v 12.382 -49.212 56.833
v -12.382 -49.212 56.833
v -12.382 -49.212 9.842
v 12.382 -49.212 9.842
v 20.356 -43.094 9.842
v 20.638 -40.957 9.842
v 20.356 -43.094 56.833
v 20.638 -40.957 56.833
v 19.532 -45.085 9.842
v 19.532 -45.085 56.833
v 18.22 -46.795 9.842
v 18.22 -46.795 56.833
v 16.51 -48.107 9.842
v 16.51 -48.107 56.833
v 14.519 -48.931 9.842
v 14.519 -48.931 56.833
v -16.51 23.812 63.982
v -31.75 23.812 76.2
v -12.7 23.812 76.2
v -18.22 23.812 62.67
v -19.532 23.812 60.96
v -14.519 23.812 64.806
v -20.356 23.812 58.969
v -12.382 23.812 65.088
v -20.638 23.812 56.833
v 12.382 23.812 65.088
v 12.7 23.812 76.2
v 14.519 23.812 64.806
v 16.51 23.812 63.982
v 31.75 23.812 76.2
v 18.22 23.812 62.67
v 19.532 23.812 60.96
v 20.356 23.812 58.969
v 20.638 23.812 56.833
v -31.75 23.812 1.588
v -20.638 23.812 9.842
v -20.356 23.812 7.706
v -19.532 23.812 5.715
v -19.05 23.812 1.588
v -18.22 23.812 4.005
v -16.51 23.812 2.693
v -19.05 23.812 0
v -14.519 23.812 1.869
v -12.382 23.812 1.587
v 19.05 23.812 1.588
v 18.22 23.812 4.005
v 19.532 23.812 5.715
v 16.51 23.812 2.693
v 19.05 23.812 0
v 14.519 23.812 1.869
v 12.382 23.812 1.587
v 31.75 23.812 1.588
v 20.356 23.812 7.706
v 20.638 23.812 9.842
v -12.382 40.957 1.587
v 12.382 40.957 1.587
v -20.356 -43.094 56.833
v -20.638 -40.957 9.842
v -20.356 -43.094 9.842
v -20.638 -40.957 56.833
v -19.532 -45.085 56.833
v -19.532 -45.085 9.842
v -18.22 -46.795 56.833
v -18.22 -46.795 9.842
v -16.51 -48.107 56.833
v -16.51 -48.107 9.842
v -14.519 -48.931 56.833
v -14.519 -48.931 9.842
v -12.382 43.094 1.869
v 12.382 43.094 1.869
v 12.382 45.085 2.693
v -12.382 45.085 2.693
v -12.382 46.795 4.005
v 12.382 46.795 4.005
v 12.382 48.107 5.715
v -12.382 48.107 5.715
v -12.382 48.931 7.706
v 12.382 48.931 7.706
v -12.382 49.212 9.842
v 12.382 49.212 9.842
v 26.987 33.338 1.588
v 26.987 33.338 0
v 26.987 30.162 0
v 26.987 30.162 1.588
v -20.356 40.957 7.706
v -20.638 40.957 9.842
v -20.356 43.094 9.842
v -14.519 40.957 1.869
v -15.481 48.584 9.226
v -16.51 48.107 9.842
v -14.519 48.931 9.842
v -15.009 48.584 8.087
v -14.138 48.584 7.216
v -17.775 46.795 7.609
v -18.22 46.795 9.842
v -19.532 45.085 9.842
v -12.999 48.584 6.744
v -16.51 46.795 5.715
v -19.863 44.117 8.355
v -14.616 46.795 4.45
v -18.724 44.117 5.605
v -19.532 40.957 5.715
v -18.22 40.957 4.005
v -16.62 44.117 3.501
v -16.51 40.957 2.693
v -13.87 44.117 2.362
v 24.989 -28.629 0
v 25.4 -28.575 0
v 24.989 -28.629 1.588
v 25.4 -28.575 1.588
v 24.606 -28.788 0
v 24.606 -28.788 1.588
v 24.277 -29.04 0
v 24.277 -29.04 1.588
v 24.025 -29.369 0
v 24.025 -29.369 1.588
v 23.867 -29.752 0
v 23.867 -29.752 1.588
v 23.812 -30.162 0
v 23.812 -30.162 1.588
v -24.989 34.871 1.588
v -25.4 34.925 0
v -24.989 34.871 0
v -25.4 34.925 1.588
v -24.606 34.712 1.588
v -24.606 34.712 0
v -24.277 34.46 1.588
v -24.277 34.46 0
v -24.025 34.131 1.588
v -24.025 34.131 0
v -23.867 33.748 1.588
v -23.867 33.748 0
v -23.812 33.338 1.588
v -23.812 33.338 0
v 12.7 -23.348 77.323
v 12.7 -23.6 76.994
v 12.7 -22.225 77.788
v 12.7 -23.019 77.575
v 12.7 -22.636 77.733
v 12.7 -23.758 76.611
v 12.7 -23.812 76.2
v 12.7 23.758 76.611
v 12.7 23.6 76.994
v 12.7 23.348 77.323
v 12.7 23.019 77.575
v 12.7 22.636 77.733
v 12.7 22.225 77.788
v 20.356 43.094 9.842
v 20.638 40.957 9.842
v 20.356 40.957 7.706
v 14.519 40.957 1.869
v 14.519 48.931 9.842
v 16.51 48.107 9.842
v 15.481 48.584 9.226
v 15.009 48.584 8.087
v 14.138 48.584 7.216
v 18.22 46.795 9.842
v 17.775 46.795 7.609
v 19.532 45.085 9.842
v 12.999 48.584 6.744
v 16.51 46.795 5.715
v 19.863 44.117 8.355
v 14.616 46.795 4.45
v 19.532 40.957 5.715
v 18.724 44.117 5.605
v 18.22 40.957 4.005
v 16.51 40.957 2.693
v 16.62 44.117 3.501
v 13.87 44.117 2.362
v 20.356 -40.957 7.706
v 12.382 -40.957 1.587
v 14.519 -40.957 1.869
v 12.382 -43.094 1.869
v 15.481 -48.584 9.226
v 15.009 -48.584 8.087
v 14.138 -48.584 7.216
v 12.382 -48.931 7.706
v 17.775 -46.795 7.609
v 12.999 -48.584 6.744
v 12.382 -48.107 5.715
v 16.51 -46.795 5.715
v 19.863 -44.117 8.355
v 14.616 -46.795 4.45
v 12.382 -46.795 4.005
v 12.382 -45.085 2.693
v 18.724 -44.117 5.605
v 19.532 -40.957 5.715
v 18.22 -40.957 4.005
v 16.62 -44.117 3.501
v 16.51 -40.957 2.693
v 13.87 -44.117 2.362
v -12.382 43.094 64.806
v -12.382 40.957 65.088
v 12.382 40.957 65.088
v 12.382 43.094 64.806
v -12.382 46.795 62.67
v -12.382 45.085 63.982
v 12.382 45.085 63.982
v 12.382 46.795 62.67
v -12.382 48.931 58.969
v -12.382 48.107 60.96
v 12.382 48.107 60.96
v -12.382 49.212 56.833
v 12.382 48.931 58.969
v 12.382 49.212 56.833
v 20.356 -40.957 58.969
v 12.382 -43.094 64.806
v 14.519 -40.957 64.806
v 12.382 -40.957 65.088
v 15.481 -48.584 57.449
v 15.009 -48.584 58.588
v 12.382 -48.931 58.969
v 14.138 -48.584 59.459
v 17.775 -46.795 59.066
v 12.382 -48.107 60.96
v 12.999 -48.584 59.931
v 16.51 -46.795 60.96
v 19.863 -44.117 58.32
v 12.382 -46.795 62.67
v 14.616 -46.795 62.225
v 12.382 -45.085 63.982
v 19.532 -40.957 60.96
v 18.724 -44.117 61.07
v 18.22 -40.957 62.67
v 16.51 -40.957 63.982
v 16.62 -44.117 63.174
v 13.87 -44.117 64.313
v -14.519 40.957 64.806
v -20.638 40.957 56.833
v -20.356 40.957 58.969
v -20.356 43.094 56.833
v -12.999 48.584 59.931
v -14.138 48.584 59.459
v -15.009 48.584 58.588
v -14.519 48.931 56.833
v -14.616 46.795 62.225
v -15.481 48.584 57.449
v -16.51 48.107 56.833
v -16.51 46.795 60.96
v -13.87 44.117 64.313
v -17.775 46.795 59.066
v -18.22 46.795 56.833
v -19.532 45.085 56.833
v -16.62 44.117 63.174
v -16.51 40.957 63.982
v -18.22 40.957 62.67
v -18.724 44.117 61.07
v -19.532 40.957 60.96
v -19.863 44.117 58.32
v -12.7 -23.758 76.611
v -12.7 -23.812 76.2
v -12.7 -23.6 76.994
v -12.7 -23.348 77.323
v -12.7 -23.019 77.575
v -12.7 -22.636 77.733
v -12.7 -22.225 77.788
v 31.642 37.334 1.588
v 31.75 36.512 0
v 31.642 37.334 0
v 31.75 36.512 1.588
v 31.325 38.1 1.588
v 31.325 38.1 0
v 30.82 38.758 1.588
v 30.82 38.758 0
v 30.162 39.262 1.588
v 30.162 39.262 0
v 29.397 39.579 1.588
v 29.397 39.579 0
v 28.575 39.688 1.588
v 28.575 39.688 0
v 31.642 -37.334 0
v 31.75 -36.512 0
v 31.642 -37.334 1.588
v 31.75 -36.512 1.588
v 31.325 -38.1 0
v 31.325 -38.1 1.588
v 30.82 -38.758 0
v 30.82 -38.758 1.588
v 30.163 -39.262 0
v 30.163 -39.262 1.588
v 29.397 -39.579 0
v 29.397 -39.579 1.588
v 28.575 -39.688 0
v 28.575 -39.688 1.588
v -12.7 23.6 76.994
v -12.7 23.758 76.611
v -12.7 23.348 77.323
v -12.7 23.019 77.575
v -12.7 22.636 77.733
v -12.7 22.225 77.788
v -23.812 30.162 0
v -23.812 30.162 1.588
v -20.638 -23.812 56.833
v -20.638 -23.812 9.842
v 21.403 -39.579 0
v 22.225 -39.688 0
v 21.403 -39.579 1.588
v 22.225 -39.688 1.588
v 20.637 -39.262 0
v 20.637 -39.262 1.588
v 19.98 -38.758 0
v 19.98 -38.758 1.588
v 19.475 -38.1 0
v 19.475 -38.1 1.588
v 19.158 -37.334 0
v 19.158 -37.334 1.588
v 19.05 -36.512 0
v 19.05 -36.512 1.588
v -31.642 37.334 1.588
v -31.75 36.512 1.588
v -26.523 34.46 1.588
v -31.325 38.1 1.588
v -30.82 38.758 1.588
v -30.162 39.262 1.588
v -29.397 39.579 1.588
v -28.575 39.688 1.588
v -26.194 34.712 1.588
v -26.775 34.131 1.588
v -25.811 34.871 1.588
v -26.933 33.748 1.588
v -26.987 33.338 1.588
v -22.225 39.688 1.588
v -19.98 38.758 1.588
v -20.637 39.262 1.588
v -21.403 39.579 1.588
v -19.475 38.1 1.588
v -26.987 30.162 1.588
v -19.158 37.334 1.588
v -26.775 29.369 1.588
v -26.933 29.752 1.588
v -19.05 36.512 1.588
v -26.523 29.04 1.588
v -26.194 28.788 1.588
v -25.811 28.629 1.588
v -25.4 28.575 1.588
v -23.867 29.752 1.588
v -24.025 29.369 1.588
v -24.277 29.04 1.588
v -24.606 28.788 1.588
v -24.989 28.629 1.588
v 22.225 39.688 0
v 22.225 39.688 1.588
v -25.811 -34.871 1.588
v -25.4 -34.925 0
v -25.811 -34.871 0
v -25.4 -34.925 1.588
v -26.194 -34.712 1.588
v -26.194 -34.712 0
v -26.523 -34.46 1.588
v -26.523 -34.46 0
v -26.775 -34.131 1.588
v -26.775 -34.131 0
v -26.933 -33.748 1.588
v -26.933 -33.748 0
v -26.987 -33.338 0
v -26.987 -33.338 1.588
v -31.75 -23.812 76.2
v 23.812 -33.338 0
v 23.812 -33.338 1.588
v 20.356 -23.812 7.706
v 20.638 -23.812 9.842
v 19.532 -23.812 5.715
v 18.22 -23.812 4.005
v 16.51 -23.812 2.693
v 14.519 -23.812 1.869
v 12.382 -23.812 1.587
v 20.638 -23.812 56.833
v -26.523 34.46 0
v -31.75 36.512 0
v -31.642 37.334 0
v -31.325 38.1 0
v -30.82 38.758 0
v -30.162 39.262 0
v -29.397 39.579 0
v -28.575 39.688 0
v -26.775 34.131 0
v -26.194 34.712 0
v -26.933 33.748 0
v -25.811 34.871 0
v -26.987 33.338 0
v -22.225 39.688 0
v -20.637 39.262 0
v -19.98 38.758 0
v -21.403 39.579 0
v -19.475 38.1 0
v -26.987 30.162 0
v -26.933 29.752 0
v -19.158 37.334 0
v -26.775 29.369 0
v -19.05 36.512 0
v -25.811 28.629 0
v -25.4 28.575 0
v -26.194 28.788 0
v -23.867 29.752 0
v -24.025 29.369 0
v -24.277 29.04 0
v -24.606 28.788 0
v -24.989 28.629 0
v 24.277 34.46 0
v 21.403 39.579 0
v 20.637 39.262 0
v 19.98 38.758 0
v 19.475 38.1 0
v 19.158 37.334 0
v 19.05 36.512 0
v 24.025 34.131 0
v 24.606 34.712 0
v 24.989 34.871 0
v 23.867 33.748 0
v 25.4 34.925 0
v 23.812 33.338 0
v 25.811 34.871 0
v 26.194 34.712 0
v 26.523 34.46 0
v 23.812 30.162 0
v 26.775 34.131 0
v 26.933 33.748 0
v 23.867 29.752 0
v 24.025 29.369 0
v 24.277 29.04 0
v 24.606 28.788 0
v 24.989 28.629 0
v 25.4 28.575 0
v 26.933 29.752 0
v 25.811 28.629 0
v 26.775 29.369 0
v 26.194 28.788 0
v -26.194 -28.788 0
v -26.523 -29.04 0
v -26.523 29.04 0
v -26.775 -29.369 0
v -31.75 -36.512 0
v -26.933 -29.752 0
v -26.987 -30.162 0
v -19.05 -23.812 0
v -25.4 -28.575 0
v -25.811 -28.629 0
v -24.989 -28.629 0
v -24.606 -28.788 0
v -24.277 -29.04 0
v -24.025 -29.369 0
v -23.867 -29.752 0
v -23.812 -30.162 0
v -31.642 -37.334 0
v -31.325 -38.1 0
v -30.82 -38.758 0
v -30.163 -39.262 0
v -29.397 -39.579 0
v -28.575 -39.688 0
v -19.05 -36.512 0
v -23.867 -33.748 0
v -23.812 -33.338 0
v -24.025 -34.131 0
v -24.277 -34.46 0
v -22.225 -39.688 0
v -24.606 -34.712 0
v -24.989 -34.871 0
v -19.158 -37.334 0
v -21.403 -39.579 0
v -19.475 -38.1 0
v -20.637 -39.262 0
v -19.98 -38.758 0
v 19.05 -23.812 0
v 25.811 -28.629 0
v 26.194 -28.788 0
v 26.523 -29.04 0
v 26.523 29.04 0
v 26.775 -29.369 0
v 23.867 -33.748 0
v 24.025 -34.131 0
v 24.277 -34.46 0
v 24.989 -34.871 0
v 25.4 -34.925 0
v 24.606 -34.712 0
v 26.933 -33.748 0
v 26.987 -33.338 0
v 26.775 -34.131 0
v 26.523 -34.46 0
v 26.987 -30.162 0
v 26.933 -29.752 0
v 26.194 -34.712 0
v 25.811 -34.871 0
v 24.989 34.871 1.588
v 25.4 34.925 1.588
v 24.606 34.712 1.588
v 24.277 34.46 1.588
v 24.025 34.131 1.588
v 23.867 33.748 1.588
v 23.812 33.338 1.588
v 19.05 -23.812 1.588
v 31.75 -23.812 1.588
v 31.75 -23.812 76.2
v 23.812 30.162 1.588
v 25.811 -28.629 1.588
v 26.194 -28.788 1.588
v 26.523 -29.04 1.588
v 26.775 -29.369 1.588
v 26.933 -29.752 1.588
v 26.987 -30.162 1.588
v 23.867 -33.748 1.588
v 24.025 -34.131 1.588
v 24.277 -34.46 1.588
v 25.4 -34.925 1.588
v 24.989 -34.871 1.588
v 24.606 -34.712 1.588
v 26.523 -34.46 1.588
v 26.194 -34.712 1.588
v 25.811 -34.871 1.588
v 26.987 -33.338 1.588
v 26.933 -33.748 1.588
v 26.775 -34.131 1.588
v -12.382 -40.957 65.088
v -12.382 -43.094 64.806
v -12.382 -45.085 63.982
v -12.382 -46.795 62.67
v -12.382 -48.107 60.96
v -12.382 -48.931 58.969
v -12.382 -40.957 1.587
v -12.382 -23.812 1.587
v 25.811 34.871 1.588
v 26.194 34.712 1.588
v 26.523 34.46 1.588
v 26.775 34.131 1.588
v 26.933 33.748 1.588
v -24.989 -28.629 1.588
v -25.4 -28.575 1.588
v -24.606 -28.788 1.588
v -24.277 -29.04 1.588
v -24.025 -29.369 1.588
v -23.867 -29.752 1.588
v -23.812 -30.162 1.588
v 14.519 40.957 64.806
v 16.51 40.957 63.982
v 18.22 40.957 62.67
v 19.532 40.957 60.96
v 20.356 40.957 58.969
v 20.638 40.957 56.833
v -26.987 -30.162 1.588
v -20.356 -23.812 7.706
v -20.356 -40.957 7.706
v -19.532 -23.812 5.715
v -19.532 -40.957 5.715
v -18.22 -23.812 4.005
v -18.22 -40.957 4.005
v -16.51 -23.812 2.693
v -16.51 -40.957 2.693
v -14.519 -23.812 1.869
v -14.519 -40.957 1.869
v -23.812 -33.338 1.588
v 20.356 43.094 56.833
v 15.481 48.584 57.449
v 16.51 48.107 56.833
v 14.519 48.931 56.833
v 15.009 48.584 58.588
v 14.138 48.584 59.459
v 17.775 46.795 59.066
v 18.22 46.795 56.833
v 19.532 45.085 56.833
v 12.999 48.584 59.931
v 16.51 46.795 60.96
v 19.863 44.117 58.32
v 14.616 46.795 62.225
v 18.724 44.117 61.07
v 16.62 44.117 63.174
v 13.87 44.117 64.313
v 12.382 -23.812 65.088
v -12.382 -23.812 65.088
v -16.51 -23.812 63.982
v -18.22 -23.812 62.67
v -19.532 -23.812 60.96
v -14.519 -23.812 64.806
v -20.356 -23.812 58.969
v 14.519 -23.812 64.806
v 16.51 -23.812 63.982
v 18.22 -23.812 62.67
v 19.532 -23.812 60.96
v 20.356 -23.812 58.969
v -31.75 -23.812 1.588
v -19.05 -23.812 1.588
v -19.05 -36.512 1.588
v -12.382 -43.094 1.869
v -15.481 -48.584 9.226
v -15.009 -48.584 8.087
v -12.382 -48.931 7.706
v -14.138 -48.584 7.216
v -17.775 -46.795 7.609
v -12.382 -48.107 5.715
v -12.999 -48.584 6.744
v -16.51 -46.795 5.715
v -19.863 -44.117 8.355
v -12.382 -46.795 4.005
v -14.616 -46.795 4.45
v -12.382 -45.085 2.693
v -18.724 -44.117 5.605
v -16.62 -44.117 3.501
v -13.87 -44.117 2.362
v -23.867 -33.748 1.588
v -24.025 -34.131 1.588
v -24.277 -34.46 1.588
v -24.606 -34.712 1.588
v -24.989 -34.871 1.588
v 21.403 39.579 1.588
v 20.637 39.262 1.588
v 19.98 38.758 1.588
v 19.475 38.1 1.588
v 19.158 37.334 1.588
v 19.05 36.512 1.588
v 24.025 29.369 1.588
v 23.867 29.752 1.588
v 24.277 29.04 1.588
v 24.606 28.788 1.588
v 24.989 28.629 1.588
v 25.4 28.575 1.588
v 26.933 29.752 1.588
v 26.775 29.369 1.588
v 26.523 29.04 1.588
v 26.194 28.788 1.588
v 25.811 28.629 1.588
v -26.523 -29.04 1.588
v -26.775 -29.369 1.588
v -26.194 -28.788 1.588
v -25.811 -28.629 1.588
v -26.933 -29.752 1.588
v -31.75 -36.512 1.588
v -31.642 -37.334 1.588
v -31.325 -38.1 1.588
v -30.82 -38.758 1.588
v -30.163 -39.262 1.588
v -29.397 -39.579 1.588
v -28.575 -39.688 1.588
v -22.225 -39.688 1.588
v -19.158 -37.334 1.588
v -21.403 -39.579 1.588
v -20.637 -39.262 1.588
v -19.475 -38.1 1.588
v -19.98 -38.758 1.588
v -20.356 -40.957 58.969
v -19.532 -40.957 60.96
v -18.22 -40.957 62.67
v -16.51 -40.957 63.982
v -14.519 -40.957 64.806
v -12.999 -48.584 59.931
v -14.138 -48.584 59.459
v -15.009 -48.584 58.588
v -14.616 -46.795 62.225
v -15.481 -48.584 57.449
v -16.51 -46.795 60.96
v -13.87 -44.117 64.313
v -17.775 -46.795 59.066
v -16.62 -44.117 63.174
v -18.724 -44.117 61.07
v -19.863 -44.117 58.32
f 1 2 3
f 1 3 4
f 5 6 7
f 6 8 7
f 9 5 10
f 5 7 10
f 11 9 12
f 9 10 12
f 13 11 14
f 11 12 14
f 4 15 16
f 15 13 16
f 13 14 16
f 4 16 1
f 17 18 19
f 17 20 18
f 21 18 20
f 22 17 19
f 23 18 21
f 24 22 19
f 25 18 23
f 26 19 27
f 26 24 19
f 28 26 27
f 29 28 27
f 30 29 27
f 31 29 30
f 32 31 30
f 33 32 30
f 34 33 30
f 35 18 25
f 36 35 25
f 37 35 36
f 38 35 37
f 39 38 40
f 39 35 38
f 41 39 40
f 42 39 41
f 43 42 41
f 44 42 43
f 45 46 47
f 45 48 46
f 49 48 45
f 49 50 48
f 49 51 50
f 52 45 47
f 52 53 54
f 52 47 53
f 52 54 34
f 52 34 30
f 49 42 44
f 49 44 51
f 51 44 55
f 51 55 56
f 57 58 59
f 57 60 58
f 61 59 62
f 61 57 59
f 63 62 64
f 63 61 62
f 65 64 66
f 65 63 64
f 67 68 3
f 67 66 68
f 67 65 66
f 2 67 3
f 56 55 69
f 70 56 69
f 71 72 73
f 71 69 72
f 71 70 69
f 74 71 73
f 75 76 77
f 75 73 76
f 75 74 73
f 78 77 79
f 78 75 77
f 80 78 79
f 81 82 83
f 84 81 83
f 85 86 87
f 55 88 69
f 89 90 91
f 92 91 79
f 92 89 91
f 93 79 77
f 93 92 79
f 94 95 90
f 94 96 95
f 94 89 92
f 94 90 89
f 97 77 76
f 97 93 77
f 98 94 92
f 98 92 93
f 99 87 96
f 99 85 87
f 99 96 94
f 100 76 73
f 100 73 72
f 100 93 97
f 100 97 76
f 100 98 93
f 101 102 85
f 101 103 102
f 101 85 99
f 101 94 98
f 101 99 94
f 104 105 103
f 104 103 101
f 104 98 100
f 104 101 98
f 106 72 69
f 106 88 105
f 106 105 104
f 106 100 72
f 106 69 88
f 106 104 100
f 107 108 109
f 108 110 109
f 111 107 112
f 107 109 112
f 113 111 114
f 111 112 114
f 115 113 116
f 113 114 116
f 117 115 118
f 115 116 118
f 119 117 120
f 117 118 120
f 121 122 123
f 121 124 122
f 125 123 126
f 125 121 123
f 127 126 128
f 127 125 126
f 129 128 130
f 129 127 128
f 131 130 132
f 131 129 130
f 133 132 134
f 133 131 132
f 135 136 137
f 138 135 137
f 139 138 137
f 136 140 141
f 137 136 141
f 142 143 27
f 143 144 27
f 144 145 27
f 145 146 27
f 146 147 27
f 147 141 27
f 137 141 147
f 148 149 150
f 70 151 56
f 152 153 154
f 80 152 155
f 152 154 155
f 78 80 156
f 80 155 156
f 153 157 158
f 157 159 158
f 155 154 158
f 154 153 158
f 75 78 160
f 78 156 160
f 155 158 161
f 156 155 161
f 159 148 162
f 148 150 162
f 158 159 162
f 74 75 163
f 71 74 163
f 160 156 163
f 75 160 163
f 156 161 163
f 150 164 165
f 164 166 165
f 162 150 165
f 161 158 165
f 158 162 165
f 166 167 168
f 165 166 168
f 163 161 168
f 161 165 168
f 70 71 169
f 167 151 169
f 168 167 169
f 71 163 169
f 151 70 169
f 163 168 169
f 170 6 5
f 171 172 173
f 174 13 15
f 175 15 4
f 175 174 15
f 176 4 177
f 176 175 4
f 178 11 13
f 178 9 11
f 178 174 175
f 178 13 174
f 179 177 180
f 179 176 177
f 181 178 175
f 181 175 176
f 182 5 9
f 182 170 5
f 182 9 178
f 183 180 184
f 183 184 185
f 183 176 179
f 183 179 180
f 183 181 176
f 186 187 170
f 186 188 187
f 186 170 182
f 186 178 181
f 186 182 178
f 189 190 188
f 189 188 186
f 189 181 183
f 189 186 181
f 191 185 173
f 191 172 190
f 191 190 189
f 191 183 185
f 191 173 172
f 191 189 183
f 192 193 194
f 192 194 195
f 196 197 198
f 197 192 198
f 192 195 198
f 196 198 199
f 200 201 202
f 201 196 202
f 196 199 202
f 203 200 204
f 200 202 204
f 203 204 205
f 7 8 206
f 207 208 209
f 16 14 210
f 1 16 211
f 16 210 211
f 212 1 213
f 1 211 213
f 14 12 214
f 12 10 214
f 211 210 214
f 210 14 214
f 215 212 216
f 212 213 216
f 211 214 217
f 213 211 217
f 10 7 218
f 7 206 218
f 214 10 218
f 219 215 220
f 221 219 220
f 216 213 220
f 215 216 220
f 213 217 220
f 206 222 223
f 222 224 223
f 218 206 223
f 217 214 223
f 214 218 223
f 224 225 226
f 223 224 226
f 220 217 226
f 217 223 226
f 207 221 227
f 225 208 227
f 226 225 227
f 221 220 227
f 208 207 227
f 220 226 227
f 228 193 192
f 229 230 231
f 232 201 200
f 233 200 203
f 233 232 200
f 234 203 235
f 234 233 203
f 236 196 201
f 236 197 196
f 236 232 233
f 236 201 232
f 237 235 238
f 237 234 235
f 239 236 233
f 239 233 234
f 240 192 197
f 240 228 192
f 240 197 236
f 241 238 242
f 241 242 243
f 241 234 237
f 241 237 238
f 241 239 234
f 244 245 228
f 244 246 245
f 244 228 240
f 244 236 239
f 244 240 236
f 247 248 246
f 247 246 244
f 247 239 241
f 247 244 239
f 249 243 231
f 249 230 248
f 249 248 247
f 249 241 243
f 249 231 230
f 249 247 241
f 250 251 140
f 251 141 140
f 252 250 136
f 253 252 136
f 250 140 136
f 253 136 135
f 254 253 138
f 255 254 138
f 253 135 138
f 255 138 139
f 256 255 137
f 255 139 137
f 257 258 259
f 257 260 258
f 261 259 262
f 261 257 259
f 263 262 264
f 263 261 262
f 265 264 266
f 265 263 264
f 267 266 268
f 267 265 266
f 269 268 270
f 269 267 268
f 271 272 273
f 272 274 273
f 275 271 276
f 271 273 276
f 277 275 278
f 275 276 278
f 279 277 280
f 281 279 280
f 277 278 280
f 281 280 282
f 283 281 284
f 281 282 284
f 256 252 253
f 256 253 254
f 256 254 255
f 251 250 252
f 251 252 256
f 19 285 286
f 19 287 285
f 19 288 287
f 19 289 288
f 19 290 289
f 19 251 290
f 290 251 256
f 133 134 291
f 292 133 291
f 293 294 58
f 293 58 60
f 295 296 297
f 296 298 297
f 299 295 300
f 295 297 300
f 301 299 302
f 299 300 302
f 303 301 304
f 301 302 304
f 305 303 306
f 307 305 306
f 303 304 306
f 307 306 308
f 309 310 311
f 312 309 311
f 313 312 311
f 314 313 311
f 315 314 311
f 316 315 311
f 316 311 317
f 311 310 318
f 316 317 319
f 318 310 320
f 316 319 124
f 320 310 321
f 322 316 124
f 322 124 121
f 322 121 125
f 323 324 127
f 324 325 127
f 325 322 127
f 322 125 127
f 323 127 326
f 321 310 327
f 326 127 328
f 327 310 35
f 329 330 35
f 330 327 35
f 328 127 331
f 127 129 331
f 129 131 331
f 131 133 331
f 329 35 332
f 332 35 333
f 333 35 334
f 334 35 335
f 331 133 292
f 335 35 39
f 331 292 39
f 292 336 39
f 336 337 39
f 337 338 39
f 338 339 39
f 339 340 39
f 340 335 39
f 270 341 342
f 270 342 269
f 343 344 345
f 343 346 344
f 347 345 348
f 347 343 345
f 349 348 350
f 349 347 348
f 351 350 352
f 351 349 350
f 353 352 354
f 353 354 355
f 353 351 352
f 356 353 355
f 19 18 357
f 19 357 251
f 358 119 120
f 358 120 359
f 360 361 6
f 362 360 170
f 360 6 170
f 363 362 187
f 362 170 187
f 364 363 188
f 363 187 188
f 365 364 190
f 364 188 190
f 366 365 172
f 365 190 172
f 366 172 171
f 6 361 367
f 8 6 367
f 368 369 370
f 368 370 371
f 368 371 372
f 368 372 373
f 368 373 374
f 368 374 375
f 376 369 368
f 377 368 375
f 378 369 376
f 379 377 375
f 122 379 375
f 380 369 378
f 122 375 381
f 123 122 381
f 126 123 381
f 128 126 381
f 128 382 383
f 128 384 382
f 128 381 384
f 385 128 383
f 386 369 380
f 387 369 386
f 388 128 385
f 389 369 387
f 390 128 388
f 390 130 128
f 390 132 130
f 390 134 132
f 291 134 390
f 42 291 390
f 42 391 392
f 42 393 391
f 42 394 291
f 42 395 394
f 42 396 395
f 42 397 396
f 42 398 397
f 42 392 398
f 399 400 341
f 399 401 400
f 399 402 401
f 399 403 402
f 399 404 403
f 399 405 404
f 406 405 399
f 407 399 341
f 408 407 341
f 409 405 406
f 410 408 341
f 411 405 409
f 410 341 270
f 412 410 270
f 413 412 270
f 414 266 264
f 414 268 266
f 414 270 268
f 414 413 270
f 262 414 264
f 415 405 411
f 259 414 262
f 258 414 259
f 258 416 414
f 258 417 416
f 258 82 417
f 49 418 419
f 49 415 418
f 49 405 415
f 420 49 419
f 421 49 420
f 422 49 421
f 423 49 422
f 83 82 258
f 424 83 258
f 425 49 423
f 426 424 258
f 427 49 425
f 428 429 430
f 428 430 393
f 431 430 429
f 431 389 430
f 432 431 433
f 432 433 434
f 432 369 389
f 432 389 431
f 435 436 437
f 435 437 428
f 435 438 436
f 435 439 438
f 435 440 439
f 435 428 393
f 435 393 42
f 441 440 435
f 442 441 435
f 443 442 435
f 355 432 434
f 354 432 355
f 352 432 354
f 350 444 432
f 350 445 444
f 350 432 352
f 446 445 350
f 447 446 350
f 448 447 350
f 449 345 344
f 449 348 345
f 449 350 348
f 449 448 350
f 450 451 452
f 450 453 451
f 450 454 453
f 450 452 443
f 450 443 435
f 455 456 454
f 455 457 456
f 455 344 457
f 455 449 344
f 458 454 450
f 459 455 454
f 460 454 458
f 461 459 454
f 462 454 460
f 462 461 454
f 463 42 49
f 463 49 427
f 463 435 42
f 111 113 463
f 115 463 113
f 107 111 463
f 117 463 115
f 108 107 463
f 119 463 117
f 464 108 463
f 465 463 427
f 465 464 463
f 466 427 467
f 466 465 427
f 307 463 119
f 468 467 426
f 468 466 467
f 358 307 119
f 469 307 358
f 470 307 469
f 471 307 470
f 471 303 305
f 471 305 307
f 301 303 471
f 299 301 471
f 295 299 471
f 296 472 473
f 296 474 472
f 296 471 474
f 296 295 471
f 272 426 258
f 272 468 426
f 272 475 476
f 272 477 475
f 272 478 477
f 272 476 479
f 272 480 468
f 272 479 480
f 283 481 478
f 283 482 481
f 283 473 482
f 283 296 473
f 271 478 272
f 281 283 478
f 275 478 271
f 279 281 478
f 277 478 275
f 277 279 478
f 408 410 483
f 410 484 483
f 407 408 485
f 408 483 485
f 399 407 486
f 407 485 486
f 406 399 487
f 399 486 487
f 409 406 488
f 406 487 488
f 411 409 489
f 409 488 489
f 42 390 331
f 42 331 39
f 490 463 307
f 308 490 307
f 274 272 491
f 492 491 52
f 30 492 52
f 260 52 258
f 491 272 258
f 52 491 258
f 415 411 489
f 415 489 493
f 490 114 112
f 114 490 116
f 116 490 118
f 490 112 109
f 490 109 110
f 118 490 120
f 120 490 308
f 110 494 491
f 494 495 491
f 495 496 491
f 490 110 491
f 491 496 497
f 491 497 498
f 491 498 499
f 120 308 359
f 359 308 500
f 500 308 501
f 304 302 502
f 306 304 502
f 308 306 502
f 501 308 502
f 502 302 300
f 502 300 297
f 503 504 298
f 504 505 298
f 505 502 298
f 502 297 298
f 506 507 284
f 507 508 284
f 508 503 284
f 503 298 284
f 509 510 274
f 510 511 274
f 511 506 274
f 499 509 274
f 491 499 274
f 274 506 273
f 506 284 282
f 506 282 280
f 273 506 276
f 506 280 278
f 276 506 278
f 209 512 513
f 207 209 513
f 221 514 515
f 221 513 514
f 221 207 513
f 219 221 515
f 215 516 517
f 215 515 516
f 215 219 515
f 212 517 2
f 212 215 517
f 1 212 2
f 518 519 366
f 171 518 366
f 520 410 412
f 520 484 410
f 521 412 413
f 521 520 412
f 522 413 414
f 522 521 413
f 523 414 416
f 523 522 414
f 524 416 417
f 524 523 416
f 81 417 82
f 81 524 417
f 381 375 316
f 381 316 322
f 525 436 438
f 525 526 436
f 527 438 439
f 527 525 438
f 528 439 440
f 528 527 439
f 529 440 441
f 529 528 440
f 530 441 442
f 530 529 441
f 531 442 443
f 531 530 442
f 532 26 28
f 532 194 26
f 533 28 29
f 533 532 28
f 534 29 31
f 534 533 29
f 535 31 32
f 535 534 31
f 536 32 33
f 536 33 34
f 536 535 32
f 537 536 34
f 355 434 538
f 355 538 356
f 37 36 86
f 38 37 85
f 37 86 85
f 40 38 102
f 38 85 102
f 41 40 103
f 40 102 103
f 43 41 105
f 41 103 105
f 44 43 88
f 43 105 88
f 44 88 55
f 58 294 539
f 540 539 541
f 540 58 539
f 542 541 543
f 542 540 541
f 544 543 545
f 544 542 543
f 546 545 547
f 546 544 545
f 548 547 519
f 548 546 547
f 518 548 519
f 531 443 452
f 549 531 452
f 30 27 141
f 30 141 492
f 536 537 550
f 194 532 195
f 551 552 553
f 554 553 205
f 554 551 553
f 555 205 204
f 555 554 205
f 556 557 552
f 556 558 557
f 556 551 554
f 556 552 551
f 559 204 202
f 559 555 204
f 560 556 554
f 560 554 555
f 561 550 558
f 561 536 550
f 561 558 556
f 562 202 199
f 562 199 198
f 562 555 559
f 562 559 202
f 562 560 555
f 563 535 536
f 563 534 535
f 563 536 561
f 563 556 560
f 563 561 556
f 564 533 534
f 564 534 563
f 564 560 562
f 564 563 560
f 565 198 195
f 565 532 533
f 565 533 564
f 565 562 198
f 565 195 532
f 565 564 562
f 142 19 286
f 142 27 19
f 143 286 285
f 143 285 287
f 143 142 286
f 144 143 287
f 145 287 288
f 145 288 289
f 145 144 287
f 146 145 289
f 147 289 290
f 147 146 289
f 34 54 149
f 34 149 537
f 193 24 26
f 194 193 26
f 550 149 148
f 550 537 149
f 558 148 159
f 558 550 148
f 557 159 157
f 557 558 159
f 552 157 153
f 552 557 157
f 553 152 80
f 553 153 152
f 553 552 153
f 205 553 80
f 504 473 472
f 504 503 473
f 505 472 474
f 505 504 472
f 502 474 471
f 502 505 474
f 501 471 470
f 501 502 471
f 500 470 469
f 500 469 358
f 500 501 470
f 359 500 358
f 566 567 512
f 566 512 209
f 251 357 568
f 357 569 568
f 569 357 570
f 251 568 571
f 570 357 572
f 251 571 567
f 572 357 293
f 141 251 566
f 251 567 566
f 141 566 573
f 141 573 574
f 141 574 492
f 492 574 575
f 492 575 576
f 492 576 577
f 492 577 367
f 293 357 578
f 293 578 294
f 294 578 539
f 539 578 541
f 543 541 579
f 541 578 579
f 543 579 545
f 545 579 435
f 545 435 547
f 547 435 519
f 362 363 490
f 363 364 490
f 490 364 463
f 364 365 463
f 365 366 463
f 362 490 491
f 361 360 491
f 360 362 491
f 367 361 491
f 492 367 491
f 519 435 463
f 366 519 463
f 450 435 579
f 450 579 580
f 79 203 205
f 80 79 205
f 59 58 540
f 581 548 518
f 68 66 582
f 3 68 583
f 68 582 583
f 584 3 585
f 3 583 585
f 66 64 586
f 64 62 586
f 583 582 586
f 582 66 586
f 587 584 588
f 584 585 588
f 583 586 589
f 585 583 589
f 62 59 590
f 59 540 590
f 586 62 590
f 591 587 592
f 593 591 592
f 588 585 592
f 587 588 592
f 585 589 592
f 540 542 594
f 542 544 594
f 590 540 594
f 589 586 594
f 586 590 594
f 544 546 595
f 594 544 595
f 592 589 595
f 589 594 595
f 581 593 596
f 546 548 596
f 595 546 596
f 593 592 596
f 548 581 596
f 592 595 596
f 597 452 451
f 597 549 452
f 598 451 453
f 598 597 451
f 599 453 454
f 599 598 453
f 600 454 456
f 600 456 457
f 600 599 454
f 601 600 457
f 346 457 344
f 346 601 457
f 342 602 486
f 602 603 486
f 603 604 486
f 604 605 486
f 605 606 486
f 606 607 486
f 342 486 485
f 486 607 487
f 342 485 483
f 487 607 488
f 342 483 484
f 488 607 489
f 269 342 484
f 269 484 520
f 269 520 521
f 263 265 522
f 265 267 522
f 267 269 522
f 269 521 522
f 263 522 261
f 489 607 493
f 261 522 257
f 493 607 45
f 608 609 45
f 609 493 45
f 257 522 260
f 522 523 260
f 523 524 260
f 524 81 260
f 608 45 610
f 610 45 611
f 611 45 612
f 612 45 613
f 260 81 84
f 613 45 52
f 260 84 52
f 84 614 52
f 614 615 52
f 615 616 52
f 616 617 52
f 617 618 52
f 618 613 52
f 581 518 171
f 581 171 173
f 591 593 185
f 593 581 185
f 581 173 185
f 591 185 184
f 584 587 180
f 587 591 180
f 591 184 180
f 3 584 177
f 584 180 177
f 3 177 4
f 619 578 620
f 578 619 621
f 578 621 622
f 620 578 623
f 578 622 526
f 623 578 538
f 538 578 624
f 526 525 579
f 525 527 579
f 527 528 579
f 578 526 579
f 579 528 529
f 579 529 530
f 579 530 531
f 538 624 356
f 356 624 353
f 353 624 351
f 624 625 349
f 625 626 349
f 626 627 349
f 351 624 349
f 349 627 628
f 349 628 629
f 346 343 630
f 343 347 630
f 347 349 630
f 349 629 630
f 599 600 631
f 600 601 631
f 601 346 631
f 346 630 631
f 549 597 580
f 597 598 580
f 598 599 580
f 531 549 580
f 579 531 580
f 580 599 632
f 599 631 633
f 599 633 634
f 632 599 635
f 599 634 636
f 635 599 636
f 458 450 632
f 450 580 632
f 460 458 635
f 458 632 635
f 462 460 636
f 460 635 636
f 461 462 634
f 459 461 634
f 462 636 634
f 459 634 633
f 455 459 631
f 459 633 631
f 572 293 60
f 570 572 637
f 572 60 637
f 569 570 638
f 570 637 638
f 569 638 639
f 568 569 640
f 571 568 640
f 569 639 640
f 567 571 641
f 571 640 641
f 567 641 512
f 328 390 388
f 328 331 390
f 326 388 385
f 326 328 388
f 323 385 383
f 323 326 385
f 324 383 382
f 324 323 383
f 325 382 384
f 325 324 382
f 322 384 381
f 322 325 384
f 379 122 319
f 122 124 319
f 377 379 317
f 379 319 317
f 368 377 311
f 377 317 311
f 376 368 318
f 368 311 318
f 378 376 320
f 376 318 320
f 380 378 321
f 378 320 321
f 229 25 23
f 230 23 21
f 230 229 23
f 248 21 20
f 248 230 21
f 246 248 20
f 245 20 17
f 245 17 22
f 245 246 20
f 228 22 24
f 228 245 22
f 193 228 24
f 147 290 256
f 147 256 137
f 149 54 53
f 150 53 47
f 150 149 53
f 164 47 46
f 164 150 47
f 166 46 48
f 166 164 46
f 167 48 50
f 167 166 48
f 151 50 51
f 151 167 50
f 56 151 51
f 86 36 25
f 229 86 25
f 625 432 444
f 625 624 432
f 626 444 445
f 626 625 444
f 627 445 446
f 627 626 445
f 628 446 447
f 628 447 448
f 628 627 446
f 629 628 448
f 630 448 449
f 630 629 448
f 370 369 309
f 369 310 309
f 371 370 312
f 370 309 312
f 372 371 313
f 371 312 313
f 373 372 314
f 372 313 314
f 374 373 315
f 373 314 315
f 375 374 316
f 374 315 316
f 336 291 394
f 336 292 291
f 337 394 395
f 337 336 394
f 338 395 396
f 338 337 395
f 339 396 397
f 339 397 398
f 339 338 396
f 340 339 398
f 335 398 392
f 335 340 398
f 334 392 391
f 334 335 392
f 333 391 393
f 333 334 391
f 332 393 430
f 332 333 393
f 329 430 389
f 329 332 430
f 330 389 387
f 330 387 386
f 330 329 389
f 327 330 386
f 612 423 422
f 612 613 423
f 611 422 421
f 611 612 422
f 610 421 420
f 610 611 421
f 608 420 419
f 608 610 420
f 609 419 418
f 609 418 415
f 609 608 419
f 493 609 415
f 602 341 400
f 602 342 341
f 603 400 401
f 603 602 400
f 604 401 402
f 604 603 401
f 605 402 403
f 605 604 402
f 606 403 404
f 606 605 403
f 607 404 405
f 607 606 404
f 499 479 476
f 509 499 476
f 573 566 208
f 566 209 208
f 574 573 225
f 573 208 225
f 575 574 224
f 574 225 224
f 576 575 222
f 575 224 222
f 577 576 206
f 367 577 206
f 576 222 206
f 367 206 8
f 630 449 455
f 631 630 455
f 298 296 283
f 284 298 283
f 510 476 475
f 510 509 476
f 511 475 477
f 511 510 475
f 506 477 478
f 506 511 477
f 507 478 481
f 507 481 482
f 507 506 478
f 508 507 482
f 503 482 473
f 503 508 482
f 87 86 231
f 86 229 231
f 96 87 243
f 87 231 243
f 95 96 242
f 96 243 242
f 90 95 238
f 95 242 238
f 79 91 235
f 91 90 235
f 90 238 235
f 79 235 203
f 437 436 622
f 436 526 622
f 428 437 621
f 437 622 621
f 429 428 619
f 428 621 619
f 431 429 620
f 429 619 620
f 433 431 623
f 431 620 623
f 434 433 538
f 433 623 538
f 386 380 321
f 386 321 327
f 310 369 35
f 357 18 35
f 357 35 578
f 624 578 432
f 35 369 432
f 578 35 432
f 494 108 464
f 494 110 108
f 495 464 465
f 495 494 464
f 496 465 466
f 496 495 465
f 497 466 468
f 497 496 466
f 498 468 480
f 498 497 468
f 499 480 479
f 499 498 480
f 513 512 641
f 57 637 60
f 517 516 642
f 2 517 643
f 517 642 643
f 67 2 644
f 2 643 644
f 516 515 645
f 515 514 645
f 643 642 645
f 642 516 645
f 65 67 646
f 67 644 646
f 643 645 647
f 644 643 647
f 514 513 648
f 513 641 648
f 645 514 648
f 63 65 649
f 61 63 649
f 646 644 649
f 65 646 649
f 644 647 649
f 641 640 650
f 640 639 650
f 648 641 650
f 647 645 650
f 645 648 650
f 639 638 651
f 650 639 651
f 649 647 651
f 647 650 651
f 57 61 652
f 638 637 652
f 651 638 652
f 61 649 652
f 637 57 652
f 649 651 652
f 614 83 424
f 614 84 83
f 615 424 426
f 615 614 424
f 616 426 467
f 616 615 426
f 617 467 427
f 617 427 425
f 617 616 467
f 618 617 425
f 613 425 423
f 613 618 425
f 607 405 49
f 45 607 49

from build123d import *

# Parameters (mm, degrees)
F0_W      = 63.5
F0_H      = 47.625
F1_DEPTH  = 76.2
F2_W      = 41.275
F2_H      = 63.5
F3_DEPTH  = 25.4
F4_R      = 8.255
F6_W      = 12.7
F6_H      = 15.875
F7_DEPTH  = 1.5875
F8_R      = 3.175
F9_W      = 3.175
F9_H      = 6.35
F10_DEPTH = 25.4
F11_R     = 1.58749
F12_W     = 25.4
F12_H     = 47.625
F13_DEPTH = 1.5875
F14_R     = 1.5875


# Not quite as in the source:
# - a fillet or chamfer is up to 0.001 mm smaller than in the source, because OpenCascade refuses the exact size


with BuildPart() as f1:
    # F0 (on Top) → F1 (new body)
    with BuildSketch(Plane.XY):
        Rectangle(F0_W, F0_H)
    extrude(amount=F1_DEPTH)

    # F2 (on face) → F3 (join)
    with BuildSketch(Plane.XZ.offset(23.8125)):
        with Locations((0, 33.3375)):
            Rectangle(F2_W, F2_H)
    extrude(amount=F3_DEPTH)

    # F4
    f4_edges = [f1.edges().sort_by_distance(p)[0] for p in [
        (-20.6375, -36.5125, 65.0875),
        (20.6375, -36.5125, 65.0875),
        (-20.6375, -36.5125, 1.5875),
        (20.6375, -36.5125, 1.5875),
        (20.6375, -49.2125, 33.3375),
        (0, -49.2125, 65.0875),
        (-20.6375, -49.2125, 33.3375),
        (0, -49.2125, 1.5875),
    ]]
    fillet(f4_edges, radius=F4_R)

    # F5: F1 across plane


with BuildPart() as f1_1:
    add(f1.part)
    add(f1.part.mirror(Plane.XZ))

    # F6 (on face) → F7 (join)
    with BuildSketch(Plane(origin=(0, 0, 0), x_dir=(1, 0, 0), z_dir=(0, 0, -1))):
        with Locations((-25.4, 31.75)):
            Rectangle(F6_W, F6_H)
        with Locations((25.4, 31.75)):
            Rectangle(F6_W, F6_H)
        with Locations((25.4, -31.75)):
            Rectangle(F6_W, F6_H)
        with Locations((-25.4, -31.75)):
            Rectangle(F6_W, F6_H)
    extrude(amount=-F7_DEPTH)

    # F8
    f8_edges = [f1_1.edges().sort_by_distance(p)[0] for p in [
        (-31.75, -39.6875, 0.79375),
        (-19.05, -39.6875, 0.79375),
        (19.05, -39.6875, 0.79375),
        (31.75, -39.6875, 0.79375),
        (31.75, 39.6875, 0.79375),
        (19.05, 39.6875, 0.79375),
        (-19.05, 39.6875, 0.79375),
        (-31.75, 39.6875, 0.79375),
    ]]
    fillet(f8_edges, radius=F8_R)

    # F9 (on face) → F10 (cut)
    with BuildSketch(Plane(origin=(0, 0, 0), x_dir=(1, 0, 0), z_dir=(0, 0, -1))):
        with Locations((-25.4, 31.75)):
            Rectangle(F9_W, F9_H)
        with Locations((25.4, 31.75)):
            Rectangle(F9_W, F9_H)
        with Locations((25.4, -31.75)):
            Rectangle(F9_W, F9_H)
        with Locations((-25.4, -31.75)):
            Rectangle(F9_W, F9_H)
    extrude(amount=-F10_DEPTH, mode=Mode.SUBTRACT)

    # F11 (radius 1.5875 in the source; OpenCascade refuses exactly that, so slightly less here)
    f11_edges = [f1_1.edges().sort_by_distance(p)[0] for p in [
        (-26.9875, -34.925, 0.79375),
        (-23.8125, -34.925, 0.79375),
        (-26.9875, -28.575, 0.79375),
        (-23.8125, -28.575, 0.79375),
        (26.9875, -28.575, 0.79375),
        (26.9875, -34.925, 0.79375),
        (23.8125, -34.925, 0.79375),
        (23.8125, -28.575, 0.79375),
        (-26.9875, 34.925, 0.79375),
        (-23.8125, 34.925, 0.79375),
        (-23.8125, 28.575, 0.79375),
        (-26.9875, 28.575, 0.79375),
        (23.8125, 28.575, 0.79375),
        (26.9875, 34.925, 0.79375),
        (23.8125, 34.925, 0.79375),
        (26.9875, 28.575, 0.79375),
    ]]
    fillet(f11_edges, radius=F11_R)

    # F12 (on face) → F13 (join)
    with BuildSketch(Plane.XY.offset(76.2)):
        Rectangle(F12_W, F12_H)
    extrude(amount=F13_DEPTH)

    # F14
    f14_edges = [f1_1.edges().sort_by_distance(p)[0] for p in [
        (0, -23.8125, 77.7875),
        (0, 23.8125, 77.7875),
    ]]
    fillet(f14_edges, radius=F14_R)


solid = f1_1.part
